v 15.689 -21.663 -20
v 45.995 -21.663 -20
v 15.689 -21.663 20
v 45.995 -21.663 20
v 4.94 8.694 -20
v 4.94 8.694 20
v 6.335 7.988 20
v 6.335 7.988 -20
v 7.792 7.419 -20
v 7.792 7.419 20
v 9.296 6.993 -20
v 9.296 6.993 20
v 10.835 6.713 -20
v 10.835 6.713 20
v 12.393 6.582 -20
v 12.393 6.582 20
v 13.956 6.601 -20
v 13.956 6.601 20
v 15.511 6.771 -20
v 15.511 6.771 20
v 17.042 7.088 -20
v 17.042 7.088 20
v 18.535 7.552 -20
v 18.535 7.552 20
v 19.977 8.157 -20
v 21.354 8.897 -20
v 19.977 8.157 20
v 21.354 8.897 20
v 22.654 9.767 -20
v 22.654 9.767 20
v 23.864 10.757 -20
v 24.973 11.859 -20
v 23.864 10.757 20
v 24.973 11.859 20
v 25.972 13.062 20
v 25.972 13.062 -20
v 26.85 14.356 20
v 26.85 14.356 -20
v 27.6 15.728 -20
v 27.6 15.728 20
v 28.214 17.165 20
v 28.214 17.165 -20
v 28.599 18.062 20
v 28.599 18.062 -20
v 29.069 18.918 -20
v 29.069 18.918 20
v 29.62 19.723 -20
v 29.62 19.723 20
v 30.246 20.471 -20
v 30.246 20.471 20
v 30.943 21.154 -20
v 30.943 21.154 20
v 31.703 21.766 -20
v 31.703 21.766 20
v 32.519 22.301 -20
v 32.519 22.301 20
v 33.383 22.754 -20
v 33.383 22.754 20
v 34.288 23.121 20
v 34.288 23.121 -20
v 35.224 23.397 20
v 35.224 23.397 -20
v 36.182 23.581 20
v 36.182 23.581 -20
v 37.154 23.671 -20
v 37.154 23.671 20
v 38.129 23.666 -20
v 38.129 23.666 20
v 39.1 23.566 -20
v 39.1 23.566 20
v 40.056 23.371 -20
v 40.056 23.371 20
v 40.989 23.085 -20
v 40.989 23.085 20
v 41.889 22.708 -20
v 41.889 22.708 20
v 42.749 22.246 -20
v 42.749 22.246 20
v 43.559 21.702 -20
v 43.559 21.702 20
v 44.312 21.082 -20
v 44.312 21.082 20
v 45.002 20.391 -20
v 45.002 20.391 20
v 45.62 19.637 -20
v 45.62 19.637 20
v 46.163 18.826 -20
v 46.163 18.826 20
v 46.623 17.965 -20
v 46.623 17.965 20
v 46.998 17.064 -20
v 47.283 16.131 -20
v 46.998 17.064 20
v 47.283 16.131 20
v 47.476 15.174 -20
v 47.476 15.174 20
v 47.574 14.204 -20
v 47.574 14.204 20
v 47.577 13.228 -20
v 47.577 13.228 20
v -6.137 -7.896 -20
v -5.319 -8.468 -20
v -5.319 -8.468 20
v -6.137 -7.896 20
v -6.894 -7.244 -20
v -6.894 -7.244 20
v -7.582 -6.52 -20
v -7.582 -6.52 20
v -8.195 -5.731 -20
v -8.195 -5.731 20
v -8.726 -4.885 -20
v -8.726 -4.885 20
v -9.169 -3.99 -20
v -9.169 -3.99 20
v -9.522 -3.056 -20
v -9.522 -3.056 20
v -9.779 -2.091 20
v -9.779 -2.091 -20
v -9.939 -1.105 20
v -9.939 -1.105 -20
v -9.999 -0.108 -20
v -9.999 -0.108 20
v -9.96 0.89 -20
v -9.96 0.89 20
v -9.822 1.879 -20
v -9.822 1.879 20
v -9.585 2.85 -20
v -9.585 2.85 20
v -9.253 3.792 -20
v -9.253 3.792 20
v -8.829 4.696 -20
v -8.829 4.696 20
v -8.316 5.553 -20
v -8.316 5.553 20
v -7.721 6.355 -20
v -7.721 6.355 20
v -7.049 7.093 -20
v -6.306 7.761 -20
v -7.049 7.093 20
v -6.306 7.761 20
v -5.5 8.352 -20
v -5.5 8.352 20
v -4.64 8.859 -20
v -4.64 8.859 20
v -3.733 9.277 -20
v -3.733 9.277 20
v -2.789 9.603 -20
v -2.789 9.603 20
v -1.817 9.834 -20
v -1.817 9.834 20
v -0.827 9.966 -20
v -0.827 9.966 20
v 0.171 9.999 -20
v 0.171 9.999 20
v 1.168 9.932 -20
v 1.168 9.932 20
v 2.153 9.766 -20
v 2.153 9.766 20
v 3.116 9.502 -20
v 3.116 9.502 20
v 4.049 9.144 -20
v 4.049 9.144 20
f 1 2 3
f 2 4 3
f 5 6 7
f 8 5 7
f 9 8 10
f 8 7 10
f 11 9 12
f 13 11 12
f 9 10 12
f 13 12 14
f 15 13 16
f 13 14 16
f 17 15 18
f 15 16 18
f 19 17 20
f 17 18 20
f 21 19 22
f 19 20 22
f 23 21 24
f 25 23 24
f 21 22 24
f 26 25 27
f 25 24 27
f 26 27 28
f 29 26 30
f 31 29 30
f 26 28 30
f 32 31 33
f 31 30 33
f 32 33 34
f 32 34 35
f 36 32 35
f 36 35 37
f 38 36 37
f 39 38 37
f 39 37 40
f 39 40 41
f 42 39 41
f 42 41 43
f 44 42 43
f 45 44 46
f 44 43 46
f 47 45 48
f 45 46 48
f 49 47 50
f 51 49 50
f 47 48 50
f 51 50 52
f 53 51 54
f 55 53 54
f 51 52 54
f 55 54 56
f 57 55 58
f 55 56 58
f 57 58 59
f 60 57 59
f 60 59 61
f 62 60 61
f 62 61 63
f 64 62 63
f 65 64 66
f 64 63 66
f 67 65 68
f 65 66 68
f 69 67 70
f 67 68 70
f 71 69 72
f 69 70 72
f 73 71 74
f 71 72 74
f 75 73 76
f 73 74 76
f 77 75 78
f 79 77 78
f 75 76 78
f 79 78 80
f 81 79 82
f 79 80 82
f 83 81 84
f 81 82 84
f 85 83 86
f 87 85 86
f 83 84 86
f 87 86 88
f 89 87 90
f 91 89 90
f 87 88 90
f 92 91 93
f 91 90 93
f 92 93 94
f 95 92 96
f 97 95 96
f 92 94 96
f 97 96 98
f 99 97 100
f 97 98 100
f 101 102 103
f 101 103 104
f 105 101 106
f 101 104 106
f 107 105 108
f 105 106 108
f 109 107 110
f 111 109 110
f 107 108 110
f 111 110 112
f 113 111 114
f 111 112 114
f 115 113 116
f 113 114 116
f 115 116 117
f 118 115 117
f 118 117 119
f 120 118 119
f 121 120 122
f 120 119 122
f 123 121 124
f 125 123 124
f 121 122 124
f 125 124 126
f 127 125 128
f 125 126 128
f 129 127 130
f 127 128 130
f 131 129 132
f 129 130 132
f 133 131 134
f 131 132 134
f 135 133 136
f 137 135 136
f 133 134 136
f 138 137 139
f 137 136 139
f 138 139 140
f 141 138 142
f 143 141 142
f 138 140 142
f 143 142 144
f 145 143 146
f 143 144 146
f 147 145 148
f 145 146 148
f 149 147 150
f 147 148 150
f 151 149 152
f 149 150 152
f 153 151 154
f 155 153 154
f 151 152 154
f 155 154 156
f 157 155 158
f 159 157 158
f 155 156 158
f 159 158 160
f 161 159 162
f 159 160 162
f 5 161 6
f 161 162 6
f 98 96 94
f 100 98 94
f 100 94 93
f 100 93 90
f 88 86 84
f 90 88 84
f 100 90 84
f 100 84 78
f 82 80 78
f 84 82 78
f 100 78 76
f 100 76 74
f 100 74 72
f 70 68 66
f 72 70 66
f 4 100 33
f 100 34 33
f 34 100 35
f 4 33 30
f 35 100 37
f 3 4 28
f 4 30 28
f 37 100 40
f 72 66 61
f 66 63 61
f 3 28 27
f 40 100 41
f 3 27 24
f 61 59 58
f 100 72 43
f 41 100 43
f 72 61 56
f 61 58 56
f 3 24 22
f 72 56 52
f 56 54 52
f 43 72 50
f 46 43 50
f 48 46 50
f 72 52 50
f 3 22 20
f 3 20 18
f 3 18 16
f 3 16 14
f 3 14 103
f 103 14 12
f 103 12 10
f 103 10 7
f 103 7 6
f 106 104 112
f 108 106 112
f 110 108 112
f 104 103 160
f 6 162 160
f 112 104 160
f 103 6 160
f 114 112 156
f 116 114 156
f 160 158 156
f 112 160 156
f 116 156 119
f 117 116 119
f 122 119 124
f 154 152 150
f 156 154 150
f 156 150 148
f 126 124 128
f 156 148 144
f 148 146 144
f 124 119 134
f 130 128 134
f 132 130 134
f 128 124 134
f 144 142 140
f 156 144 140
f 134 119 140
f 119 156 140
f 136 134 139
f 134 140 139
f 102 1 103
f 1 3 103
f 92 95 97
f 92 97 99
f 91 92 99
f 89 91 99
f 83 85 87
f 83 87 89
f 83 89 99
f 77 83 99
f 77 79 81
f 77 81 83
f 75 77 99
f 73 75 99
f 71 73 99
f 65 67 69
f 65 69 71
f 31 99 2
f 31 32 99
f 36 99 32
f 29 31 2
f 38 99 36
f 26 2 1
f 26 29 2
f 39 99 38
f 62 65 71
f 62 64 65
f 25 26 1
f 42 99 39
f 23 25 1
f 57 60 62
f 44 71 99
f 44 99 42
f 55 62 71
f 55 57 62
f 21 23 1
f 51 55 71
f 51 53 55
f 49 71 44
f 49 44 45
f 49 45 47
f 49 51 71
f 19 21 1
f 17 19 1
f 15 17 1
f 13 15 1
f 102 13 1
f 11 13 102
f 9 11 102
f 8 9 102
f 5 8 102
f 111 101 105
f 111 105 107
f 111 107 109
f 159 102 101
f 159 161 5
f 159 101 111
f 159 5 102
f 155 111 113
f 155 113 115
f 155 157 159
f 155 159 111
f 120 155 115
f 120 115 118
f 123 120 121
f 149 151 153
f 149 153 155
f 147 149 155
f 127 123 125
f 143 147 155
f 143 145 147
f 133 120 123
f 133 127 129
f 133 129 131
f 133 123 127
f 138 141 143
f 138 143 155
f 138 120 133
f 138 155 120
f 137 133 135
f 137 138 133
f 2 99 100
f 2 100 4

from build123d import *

# Parameters (mm, degrees)
EXTRUDE_1_DEPTH = 20


with BuildPart() as part:
    # 草图1 → 凸台-拉伸1 (new, symmetric)
    with BuildSketch(Plane.XY):
        with BuildLine():
            Line((47.577439338, 13.227810722), (45.99529172, -21.662716293))
            Line((45.99529172, -21.662716293), (15.689460366, -21.662716293))
            Line((15.689460366, -21.662716293), (-5.318631208, -8.468303377))
            ThreePointArc((-5.318631208, -8.468303377), (-8.583413456, 5.130790723), (4.940460041, 8.694357629))
            ThreePointArc((4.940460041, 8.694357629), (18.534857961, 7.551984283), (28.214467512, 17.165403581))
            ThreePointArc((28.214467512, 17.165403581), (39.580485947, 23.480235483), (47.577439338, 13.227810722))
        make_face()
    extrude(amount=EXTRUDE_1_DEPTH, both=True)


solid = part.part
